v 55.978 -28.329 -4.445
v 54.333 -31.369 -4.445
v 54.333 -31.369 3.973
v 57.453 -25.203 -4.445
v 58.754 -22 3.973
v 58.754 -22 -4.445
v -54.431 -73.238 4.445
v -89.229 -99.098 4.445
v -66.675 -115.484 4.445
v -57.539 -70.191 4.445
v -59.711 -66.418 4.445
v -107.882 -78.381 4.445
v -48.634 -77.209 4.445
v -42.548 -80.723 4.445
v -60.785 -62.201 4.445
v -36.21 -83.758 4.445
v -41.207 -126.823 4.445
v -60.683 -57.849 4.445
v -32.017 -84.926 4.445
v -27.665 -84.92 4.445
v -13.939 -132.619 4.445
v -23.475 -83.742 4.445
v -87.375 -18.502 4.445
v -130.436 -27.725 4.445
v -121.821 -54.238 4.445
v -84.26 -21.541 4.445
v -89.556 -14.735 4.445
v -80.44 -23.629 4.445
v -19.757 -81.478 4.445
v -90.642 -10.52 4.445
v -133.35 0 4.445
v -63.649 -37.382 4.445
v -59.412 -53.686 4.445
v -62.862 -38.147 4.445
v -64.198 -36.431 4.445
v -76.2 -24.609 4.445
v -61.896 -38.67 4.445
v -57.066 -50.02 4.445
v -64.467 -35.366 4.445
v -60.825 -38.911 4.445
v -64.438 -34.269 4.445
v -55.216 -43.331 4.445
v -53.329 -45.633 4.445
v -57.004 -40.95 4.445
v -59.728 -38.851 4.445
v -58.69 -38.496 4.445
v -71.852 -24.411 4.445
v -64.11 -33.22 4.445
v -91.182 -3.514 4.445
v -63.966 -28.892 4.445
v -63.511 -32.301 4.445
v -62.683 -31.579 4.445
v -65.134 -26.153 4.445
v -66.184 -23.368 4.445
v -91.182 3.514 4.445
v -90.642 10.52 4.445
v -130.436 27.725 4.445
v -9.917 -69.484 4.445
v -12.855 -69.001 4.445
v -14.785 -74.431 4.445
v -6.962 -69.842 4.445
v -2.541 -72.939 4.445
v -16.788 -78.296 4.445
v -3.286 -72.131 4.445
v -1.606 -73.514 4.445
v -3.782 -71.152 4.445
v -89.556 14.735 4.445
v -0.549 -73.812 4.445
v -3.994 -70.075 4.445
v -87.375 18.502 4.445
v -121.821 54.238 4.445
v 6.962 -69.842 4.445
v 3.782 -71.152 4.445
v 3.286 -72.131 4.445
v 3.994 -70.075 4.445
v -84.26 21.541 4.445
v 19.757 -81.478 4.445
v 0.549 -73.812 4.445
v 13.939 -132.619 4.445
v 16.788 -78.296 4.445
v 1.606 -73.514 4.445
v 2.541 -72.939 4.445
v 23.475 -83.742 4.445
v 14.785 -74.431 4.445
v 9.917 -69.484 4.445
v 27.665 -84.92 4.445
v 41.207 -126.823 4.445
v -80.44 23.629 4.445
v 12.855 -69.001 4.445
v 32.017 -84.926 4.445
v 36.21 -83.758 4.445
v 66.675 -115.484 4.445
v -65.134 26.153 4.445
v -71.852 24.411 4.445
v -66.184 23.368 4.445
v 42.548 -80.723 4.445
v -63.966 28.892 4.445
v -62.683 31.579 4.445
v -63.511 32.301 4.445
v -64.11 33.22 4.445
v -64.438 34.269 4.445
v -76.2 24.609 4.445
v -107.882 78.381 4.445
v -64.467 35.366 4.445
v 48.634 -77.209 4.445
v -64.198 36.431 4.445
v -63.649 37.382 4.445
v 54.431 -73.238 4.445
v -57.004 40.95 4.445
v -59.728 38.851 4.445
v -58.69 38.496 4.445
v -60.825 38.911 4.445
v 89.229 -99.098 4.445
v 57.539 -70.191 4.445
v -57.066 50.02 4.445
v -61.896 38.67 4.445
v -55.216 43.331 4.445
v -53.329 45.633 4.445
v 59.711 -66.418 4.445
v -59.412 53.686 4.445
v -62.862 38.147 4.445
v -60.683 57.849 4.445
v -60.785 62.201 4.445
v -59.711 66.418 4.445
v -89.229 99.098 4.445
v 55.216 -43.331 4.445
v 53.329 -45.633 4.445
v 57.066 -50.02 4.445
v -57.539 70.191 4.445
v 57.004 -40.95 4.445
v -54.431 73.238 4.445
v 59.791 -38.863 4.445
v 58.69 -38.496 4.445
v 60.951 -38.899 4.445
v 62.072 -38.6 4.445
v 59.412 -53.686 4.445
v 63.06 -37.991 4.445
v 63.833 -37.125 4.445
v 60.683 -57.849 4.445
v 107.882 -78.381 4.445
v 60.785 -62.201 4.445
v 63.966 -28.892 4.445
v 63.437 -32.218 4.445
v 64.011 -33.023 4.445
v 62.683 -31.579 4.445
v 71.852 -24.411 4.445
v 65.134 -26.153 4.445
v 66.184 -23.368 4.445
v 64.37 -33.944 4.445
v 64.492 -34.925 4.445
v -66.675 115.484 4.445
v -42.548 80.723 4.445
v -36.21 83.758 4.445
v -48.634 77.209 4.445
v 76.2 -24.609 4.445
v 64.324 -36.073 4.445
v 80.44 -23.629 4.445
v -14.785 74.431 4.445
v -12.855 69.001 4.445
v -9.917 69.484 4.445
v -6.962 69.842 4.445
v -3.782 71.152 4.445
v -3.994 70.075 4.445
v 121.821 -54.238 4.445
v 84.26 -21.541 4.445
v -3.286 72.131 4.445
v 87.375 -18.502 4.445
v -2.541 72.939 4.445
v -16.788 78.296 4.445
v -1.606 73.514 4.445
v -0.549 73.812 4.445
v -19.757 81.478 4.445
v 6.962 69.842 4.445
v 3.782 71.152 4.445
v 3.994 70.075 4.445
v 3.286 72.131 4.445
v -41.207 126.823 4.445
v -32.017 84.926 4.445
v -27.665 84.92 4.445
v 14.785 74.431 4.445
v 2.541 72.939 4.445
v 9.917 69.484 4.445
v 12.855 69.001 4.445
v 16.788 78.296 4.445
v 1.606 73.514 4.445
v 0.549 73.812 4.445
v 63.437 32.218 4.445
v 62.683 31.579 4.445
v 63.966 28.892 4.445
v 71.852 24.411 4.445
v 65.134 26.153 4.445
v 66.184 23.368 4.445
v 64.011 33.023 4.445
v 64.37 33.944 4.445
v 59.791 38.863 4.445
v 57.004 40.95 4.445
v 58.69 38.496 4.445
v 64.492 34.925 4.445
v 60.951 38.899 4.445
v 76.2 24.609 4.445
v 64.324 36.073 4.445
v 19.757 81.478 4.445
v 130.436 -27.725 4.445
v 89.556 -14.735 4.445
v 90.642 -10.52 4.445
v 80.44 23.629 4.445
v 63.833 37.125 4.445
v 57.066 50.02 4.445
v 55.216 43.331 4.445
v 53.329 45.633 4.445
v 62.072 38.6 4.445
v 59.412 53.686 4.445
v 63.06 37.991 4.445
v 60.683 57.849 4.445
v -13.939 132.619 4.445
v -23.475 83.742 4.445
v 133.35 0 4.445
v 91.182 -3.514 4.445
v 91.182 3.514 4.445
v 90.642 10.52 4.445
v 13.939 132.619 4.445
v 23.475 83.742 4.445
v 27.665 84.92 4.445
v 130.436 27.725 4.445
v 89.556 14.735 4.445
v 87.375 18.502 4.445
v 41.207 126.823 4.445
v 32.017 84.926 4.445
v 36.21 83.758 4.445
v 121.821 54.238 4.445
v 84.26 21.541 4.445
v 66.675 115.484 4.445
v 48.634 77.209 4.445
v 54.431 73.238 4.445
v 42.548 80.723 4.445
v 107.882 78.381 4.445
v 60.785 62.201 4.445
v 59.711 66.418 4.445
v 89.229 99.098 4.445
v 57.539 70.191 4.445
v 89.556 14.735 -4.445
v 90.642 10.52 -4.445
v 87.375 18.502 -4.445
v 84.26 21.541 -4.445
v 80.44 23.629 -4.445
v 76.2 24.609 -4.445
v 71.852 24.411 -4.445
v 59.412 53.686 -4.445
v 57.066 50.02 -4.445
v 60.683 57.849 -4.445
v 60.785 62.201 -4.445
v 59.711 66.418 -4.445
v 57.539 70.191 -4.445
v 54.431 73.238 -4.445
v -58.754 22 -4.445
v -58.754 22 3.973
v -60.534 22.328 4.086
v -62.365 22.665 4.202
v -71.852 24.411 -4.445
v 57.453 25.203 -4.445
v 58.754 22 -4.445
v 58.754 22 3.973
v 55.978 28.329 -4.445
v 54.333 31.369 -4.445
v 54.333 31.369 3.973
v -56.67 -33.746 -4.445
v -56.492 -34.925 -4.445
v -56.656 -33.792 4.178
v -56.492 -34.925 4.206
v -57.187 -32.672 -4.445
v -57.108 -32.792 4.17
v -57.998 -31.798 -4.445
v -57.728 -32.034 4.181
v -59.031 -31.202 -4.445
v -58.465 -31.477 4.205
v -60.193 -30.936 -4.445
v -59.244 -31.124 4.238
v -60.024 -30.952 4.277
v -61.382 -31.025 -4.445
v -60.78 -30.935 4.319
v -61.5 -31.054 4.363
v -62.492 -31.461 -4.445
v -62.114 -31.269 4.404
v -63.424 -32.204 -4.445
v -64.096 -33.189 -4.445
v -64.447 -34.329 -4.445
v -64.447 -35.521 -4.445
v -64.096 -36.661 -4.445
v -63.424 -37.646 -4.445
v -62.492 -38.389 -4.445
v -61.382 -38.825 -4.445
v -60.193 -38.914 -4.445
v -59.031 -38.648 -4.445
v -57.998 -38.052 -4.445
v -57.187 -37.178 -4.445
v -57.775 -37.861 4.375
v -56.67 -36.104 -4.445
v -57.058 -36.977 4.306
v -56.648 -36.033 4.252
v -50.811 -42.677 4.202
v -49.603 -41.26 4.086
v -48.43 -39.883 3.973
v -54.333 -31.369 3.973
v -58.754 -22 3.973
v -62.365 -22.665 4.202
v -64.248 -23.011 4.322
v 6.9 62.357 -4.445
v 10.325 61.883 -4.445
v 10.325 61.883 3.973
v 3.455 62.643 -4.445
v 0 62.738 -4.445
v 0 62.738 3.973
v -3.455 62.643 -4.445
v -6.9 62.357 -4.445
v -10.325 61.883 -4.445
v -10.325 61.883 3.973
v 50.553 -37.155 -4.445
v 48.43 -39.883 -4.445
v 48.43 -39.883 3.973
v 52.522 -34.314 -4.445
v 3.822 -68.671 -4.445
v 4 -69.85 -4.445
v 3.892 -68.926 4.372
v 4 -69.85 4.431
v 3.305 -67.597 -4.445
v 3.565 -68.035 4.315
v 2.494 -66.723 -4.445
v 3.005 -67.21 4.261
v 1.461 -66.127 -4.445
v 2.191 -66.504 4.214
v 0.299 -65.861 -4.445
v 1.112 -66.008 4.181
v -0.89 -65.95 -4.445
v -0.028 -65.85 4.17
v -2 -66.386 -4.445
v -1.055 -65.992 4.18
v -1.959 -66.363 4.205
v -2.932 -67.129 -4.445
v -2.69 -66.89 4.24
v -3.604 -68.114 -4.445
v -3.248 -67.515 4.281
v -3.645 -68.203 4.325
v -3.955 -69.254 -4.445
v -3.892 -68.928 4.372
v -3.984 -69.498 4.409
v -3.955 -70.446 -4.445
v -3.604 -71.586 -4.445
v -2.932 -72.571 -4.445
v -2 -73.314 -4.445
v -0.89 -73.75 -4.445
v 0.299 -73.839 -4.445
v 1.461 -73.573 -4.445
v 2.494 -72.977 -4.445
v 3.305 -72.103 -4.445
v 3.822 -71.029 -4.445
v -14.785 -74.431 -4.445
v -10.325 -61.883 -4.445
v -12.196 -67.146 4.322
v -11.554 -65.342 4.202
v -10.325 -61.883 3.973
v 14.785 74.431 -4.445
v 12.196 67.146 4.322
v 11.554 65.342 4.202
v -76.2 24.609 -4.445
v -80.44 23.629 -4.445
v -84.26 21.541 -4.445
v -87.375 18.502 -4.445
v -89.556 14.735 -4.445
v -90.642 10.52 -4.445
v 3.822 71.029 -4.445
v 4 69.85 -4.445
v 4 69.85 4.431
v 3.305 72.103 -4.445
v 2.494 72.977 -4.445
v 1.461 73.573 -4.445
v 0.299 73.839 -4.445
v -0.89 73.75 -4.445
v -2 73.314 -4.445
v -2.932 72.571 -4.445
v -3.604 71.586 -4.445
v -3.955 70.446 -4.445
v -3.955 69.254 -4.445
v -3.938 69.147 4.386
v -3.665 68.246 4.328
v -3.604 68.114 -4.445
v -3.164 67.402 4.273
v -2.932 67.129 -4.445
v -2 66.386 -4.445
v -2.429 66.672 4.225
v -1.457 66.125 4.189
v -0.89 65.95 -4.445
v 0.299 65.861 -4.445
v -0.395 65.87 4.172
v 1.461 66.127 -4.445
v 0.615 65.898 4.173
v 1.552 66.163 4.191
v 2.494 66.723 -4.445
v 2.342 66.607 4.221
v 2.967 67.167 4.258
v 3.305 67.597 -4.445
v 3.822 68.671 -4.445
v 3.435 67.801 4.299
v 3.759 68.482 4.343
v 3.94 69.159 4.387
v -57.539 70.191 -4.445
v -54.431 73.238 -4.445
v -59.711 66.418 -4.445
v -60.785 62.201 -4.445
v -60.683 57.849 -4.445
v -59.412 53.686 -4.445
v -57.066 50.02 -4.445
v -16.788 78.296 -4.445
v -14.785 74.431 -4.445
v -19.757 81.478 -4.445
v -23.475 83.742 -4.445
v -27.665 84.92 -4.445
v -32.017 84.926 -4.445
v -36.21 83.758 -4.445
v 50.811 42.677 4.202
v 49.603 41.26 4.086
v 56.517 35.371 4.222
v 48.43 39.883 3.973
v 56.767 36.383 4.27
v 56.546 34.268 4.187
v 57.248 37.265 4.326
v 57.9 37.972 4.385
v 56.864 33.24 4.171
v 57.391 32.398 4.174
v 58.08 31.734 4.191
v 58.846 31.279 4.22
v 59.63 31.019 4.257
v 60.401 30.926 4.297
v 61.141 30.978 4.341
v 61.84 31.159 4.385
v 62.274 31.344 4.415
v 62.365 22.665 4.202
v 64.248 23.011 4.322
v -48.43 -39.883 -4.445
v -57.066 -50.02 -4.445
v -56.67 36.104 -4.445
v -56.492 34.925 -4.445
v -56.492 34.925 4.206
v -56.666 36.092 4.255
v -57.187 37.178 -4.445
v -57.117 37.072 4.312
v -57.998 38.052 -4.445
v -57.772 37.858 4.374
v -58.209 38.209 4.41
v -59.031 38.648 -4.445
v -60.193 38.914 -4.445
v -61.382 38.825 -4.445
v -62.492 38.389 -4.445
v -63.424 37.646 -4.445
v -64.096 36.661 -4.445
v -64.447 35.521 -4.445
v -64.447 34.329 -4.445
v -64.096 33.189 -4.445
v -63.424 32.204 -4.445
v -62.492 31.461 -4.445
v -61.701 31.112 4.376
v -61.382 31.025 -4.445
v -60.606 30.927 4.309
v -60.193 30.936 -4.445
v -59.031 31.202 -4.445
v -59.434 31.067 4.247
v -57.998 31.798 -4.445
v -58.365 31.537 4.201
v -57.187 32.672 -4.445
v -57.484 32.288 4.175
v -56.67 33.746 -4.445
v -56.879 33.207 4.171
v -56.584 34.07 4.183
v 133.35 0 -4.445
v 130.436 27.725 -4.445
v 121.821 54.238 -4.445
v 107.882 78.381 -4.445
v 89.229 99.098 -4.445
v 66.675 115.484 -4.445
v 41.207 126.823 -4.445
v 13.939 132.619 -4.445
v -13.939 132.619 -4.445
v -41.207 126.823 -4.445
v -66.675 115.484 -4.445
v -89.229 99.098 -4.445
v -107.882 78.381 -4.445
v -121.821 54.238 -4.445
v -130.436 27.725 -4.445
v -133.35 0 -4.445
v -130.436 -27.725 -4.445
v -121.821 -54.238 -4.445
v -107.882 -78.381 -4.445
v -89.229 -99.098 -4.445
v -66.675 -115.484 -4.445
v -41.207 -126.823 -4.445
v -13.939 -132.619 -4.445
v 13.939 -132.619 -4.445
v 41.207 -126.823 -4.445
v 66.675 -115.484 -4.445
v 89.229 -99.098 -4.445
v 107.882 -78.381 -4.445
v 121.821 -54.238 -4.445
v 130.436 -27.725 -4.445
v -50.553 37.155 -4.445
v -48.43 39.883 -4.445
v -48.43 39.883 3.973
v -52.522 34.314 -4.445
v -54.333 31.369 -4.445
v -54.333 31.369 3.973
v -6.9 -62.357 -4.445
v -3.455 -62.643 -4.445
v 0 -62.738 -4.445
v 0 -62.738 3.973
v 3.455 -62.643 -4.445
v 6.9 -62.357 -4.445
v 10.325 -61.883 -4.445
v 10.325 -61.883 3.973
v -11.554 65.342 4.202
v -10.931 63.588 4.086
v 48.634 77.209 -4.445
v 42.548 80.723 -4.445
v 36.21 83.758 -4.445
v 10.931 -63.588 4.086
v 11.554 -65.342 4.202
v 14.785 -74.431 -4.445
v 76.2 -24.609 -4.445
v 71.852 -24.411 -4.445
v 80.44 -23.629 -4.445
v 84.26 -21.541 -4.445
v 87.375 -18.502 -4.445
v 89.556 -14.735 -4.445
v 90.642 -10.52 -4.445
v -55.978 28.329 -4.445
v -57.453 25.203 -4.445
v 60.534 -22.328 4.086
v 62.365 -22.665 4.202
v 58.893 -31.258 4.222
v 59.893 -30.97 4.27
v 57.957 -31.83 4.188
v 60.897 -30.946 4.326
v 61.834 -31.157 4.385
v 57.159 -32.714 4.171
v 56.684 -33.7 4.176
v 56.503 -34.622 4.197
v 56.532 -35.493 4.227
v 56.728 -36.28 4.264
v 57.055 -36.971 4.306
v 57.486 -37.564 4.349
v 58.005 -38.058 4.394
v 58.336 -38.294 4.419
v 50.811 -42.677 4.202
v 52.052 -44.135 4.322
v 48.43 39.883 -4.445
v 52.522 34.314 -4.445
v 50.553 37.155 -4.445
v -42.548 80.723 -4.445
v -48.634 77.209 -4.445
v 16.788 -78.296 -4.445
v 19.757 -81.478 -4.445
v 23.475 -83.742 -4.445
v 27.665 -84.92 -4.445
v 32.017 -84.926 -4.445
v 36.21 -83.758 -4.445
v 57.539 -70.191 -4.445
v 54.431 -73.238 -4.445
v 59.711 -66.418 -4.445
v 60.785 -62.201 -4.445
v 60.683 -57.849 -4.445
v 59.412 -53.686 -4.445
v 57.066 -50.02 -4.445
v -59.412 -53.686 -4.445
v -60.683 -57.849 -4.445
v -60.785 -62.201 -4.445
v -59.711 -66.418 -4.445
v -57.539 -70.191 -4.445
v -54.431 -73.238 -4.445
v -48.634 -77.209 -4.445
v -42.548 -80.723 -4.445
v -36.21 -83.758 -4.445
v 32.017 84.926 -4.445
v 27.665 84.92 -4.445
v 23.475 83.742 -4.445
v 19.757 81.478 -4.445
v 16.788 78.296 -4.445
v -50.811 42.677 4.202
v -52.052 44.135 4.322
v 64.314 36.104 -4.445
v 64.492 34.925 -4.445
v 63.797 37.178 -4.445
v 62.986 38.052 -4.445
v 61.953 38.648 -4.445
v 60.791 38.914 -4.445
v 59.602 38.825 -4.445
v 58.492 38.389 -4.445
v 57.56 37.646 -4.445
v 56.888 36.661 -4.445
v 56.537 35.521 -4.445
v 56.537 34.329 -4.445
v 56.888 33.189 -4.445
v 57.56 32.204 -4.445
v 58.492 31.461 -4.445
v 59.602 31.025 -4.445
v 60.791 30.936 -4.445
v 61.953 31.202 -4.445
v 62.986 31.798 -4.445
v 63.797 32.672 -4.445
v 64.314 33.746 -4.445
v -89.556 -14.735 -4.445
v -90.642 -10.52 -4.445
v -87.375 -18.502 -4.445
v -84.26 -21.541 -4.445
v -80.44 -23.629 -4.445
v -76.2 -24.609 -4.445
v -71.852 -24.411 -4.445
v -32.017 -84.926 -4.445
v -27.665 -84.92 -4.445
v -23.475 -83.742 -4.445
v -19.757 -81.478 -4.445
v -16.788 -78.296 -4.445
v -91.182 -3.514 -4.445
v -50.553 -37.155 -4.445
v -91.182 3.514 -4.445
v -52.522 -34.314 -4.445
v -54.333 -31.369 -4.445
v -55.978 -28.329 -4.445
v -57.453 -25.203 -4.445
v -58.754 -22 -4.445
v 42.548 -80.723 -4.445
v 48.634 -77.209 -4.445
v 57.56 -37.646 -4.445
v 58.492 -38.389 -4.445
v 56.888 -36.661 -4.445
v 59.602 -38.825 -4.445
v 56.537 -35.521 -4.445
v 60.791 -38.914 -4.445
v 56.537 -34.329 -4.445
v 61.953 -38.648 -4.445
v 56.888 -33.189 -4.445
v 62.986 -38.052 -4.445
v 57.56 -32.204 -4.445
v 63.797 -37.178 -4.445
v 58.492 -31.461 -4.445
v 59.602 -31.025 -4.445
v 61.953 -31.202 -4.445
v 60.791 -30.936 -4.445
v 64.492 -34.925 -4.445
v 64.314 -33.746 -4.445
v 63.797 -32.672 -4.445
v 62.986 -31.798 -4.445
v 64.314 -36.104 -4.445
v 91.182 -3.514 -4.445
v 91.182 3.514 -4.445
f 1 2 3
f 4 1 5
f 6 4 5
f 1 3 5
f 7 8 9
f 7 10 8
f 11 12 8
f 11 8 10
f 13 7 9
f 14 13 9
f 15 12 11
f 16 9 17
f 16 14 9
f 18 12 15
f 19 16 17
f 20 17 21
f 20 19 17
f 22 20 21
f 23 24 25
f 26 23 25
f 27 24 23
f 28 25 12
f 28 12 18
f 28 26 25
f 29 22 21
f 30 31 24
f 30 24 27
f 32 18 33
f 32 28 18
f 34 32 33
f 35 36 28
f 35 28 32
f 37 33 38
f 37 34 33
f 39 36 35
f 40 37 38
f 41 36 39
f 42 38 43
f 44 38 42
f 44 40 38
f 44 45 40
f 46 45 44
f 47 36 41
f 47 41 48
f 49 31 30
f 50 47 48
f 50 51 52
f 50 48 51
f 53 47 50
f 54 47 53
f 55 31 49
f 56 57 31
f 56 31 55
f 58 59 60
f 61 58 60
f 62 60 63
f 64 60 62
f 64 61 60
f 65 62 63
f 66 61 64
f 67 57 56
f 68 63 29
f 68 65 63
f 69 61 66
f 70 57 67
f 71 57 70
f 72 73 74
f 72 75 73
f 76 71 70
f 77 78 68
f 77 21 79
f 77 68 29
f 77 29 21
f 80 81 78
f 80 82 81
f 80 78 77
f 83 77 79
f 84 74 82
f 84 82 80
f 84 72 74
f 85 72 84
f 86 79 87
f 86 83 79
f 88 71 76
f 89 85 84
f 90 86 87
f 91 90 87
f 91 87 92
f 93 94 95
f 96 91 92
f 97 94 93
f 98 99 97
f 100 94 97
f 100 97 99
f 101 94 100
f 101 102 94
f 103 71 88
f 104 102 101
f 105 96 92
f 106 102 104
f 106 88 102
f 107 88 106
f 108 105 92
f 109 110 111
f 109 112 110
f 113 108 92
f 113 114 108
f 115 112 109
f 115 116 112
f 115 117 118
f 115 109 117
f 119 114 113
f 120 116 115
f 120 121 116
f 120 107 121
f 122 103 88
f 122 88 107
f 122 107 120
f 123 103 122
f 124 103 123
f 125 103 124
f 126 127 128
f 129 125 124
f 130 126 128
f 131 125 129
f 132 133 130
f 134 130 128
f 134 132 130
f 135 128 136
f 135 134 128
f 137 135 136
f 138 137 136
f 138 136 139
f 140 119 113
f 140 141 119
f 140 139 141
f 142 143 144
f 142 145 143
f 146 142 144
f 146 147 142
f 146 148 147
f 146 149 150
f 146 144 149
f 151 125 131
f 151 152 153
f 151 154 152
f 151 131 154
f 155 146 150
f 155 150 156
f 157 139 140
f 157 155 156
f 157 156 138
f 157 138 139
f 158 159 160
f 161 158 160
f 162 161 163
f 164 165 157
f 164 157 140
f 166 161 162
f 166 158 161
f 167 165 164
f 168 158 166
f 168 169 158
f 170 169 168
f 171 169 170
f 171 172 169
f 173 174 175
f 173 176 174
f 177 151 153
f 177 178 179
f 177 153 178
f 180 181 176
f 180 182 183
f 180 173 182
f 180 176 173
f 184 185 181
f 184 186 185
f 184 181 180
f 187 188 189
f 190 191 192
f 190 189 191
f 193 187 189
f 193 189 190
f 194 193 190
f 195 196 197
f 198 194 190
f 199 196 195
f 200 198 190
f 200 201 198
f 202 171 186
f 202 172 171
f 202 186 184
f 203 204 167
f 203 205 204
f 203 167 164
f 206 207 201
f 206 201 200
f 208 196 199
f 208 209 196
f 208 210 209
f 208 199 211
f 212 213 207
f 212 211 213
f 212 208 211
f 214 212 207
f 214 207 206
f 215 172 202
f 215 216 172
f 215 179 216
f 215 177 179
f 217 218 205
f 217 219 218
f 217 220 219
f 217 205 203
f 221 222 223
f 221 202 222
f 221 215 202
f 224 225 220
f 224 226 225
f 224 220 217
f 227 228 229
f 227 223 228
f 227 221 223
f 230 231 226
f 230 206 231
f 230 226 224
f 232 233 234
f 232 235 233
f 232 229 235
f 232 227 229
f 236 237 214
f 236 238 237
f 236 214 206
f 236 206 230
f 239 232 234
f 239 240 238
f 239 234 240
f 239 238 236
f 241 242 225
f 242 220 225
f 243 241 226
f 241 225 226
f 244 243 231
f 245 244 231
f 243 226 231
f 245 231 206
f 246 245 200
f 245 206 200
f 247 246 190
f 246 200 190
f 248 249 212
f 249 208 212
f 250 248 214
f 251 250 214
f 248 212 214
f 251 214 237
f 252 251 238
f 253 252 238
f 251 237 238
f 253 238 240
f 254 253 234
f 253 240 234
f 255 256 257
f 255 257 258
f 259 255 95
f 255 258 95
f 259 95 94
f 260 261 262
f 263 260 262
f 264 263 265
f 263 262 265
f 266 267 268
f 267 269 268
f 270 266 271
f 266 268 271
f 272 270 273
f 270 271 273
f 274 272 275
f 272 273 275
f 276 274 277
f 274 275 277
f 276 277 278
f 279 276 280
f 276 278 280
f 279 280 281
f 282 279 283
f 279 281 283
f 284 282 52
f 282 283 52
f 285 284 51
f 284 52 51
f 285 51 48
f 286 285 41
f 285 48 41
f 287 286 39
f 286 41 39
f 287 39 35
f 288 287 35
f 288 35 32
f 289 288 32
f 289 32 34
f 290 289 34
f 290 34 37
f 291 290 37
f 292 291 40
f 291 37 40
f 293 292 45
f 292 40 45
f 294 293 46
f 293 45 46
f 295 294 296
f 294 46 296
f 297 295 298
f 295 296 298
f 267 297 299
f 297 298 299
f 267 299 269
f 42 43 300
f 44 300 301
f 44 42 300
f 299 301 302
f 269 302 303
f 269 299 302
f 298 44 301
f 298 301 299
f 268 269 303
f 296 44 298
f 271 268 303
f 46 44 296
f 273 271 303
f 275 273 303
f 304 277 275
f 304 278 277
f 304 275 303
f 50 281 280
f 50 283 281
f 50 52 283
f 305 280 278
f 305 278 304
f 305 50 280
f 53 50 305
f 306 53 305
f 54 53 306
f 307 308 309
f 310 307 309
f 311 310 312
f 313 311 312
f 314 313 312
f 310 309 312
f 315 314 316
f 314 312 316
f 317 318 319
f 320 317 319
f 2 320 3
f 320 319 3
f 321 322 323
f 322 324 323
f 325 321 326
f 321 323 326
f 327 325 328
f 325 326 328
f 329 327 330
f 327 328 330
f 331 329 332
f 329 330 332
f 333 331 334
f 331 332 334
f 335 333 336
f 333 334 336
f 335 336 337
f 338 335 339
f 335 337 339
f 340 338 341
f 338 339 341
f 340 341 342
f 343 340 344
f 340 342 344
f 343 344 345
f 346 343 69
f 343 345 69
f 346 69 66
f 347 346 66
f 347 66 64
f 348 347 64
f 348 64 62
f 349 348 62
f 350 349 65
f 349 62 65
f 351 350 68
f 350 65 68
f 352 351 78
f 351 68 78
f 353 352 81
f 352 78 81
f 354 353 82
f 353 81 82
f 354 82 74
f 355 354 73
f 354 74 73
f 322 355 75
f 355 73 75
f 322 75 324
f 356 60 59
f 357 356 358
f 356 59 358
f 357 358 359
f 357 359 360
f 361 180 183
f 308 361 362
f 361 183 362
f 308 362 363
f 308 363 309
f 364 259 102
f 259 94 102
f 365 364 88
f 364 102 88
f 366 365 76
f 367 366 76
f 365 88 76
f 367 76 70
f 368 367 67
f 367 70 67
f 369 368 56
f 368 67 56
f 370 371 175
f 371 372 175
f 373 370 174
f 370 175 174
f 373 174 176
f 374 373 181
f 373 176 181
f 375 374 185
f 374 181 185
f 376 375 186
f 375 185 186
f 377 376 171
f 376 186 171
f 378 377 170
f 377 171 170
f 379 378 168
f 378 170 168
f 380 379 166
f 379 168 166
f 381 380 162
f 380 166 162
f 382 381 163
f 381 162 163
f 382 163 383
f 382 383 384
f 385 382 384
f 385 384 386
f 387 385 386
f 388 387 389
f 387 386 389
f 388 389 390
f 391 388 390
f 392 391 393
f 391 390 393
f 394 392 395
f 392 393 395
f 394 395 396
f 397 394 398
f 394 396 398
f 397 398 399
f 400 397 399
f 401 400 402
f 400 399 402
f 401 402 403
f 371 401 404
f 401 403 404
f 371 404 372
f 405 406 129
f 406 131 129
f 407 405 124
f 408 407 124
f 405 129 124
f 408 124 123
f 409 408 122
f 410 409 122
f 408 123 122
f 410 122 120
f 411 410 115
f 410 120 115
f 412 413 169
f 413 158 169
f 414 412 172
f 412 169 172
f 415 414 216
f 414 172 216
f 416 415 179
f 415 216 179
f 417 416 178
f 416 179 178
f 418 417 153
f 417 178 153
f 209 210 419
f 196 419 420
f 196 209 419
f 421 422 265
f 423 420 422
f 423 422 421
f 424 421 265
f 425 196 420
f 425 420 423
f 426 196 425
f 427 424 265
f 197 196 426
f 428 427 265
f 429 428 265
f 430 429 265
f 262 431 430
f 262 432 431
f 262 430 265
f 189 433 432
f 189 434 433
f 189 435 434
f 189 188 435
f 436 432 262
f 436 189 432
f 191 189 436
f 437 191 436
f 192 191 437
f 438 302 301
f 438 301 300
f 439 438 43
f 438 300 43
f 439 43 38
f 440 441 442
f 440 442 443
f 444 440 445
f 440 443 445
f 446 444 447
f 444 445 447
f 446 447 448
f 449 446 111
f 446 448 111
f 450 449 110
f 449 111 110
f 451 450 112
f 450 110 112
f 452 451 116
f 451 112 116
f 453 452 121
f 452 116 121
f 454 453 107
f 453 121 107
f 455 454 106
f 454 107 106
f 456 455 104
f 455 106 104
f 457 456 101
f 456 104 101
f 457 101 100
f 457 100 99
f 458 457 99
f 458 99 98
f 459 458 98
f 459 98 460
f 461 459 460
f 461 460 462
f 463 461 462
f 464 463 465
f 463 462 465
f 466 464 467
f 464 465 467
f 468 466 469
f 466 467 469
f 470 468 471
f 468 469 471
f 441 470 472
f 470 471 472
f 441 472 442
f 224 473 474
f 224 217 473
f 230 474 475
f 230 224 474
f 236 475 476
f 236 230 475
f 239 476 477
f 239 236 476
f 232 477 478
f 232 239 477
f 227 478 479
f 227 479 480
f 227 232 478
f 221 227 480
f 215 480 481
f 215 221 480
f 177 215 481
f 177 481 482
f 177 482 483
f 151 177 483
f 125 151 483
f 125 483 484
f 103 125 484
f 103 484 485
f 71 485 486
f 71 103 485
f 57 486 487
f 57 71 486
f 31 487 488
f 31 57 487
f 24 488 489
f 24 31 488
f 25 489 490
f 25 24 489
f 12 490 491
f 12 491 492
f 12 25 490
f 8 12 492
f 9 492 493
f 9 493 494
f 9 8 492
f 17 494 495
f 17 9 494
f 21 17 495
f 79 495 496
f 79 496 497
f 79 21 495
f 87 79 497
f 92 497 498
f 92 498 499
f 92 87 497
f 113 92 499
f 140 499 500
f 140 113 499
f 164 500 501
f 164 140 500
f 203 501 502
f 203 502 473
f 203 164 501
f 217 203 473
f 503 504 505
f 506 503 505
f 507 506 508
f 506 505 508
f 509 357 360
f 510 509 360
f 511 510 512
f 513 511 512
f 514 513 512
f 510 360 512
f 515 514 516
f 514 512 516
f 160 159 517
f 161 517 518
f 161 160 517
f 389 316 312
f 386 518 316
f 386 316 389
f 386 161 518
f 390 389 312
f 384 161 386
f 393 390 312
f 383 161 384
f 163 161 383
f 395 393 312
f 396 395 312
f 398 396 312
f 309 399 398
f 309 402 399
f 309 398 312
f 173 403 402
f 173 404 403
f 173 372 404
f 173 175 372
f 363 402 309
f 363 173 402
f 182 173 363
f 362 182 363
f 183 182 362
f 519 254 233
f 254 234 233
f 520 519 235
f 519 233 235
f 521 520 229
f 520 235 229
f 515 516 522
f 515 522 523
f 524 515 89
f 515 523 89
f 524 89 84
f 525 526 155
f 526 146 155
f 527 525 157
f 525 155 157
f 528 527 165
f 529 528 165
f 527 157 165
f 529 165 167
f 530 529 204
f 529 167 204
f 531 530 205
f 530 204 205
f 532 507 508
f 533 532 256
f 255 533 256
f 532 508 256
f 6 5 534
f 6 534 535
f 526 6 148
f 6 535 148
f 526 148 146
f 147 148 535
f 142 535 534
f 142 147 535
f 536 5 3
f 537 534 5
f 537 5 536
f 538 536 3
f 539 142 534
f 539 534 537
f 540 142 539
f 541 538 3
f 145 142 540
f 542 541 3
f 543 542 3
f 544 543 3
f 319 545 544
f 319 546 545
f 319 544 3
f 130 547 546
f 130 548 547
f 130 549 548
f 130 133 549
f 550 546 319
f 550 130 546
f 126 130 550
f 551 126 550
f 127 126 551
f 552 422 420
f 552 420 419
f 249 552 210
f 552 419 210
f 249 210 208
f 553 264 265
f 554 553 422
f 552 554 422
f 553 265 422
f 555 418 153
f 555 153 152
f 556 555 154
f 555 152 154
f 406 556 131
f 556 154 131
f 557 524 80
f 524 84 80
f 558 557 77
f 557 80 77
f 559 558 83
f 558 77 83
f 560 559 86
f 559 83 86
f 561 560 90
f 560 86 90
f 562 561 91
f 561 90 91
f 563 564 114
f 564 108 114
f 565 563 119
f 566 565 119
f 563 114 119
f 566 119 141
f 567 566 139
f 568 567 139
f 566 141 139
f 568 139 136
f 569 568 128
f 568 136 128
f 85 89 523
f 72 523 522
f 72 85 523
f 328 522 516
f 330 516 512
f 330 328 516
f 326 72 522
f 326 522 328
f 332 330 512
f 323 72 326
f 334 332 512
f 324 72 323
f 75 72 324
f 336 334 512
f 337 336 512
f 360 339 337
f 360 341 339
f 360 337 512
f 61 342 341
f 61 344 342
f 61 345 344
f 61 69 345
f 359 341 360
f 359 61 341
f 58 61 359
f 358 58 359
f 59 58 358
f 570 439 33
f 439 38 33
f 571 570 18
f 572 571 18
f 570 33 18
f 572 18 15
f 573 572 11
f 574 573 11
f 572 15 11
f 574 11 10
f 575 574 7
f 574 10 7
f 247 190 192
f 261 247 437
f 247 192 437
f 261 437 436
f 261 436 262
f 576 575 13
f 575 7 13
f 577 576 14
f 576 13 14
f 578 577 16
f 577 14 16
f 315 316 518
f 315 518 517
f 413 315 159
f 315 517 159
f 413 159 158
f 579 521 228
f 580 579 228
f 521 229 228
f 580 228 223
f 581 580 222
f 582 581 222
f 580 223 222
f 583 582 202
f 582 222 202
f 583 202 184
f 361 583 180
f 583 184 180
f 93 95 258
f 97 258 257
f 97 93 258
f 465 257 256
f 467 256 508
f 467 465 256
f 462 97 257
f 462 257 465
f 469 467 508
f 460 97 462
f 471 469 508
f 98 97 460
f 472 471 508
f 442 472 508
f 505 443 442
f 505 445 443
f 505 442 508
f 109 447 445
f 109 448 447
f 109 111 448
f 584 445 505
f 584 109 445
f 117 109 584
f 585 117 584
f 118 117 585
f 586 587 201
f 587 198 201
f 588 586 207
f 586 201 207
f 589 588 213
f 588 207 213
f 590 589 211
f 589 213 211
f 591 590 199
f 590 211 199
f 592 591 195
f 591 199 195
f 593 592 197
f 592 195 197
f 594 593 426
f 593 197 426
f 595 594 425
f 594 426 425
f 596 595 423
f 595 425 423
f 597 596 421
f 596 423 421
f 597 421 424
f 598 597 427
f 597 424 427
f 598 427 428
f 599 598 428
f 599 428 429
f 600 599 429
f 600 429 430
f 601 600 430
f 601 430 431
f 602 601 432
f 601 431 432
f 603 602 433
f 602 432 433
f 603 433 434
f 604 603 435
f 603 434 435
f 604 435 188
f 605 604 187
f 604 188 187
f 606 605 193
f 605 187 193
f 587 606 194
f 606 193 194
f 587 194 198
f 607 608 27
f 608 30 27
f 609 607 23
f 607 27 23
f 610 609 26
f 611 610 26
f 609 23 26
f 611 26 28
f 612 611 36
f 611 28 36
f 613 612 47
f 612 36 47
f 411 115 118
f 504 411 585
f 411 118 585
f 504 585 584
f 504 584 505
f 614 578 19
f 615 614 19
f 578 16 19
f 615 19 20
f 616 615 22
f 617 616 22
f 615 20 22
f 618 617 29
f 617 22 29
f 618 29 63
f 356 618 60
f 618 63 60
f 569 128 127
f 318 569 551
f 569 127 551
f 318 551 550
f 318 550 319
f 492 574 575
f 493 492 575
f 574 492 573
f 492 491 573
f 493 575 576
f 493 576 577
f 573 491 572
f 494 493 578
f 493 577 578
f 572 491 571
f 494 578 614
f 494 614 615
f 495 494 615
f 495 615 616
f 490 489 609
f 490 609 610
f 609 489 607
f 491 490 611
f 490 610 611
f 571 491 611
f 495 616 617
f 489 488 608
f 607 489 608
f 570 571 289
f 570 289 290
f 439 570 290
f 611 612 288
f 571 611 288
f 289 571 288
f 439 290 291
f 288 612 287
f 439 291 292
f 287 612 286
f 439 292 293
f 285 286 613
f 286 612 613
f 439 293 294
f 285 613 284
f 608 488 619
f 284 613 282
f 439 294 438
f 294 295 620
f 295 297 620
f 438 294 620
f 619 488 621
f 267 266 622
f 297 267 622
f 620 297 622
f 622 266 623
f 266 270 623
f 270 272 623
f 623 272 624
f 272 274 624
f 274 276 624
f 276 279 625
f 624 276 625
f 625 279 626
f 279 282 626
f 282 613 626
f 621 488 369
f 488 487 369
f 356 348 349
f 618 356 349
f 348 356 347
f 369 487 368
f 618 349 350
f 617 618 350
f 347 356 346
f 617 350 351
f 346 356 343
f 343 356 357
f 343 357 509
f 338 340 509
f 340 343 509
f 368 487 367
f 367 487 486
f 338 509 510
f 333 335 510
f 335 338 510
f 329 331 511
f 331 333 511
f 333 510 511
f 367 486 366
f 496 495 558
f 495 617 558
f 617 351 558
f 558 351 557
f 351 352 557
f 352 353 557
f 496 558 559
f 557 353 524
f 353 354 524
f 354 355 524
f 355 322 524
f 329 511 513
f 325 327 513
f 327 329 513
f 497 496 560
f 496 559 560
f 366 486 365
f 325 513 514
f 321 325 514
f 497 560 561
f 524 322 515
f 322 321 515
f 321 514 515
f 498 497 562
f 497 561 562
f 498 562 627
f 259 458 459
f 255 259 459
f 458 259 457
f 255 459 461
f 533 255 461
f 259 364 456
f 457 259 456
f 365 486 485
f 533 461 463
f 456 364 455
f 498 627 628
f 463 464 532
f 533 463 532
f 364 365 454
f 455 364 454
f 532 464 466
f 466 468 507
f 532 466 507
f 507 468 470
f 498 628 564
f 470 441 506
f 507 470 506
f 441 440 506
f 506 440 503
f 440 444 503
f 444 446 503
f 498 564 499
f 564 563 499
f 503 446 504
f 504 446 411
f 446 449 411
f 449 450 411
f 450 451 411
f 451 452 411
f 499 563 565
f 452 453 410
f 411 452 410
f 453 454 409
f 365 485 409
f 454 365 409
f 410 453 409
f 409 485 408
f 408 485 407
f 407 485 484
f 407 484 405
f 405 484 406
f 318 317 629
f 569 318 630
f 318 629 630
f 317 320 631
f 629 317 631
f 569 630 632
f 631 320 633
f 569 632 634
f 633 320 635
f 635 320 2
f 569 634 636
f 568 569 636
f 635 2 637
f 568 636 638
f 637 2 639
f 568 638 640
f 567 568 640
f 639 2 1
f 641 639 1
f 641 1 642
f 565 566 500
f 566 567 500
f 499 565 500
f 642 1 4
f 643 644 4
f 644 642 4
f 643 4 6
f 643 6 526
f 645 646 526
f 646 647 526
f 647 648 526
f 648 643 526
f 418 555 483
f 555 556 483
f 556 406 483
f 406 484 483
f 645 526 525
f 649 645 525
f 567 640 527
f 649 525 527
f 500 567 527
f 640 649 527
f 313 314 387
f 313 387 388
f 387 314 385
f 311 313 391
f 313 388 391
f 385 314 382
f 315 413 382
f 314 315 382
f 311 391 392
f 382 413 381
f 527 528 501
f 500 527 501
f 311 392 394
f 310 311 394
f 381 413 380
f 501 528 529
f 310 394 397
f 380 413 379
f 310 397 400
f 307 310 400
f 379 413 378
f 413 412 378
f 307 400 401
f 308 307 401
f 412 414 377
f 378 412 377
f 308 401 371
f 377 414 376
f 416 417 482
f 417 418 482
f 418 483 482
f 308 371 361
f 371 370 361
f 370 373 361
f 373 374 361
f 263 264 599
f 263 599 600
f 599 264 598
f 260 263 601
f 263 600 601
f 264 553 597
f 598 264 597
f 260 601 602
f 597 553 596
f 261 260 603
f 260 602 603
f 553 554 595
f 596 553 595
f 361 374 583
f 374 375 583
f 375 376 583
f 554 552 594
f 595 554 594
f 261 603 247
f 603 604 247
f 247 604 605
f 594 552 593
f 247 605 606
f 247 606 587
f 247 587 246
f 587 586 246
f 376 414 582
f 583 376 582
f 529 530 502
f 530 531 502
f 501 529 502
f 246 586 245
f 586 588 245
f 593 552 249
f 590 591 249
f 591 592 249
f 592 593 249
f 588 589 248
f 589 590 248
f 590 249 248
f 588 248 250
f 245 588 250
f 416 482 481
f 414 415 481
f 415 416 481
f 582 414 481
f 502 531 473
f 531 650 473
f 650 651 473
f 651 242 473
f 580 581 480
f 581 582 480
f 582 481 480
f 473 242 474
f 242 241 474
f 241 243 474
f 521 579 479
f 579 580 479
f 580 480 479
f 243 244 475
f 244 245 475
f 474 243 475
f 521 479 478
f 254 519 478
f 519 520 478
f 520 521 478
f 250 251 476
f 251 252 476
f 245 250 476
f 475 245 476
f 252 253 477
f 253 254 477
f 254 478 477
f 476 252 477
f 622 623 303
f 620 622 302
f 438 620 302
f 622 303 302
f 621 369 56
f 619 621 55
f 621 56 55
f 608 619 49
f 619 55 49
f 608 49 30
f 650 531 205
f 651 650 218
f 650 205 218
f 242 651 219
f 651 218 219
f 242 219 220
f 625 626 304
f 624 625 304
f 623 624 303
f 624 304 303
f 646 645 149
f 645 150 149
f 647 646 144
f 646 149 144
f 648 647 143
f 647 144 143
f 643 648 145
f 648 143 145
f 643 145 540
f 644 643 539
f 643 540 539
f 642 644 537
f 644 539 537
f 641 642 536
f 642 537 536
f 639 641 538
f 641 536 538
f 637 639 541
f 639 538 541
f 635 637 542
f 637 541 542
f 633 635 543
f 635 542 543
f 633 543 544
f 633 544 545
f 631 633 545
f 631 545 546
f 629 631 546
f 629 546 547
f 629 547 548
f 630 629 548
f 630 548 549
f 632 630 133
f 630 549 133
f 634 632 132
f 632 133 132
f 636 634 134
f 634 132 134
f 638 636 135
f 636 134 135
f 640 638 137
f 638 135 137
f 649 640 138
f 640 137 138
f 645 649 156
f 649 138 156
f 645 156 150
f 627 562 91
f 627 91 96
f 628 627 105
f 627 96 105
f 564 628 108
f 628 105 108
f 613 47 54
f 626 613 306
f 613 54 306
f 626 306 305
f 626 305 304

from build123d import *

# Parameters (mm, degrees)
BOSS_EXTRUDE1_DEPTH      = 4.445
BOSS_EXTRUDE1_DEPTH_BACK = 4.445
SKETCH1_R                = 133.35
SKETCH1_R_2              = 4


with BuildPart() as part:
    # Sketch1 → Boss-Extrude1 (new, two sides: drawn at the far end of the back side and taken through both)
    with BuildSketch(Plane.XY.offset(-BOSS_EXTRUDE1_DEPTH_BACK)):
        Circle(SKETCH1_R)
        with Locations((0, 69.85)):
            Circle(SKETCH1_R_2, mode=Mode.SUBTRACT)
        with Locations((60.491874454, 34.925)):
            Circle(SKETCH1_R_2, mode=Mode.SUBTRACT)
        with Locations((60.491874454, -34.925)):
            Circle(SKETCH1_R_2, mode=Mode.SUBTRACT)
        with Locations((0, -69.85)):
            Circle(SKETCH1_R_2, mode=Mode.SUBTRACT)
        with Locations((-60.491874454, -34.925)):
            Circle(SKETCH1_R_2, mode=Mode.SUBTRACT)
        with Locations((-60.491874454, 34.925)):
            Circle(SKETCH1_R_2, mode=Mode.SUBTRACT)
        with BuildLine():
            Line((14.785375278, 74.430875165), (10.324543782, 61.882634395))
            ThreePointArc((10.324543782, 61.882634395), (5.179957882, 62.523792914), (0, 62.738))
            ThreePointArc((0, 62.738), (-5.179957882, 62.523792914), (-10.324543782, 61.882634395))
            Line((-10.324543782, 61.882634395), (-14.785375278, 74.430875165))
            ThreePointArc((-14.785375278, 74.430875165), (-23.474698759, 83.741706154), (-36.210304588, 83.757843464))
            ThreePointArc((-36.210304588, 83.757843464), (-45.625, 79.024818095), (-54.431267912, 73.237965383))
            ThreePointArc((-54.431267912, 73.237965383), (-60.785095506, 62.200538548), (-57.06634108, 50.019948178))
            Line((-57.06634108, 50.019948178), (-48.429661548, 39.882634395))
            ThreePointArc((-48.429661548, 39.882634395), (-51.557214064, 35.747871573), (-54.332701783, 31.369))
            ThreePointArc((-54.332701783, 31.369), (-56.737171945, 26.775921341), (-58.75420533, 22))
            Line((-58.75420533, 22), (-71.851716358, 24.410926987))
            ThreePointArc((-71.851716358, 24.410926987), (-84.259794265, 21.541167606), (-90.641572499, 10.51987808))
            ThreePointArc((-90.641572499, 10.51987808), (-91.25, 0), (-90.641572499, -10.51987808))
            ThreePointArc((-90.641572499, -10.51987808), (-84.259794265, -21.541167606), (-71.851716358, -24.410926987))
            Line((-71.851716358, -24.410926987), (-58.75420533, -22))
            ThreePointArc((-58.75420533, -22), (-56.737171945, -26.775921341), (-54.332701783, -31.369))
            ThreePointArc((-54.332701783, -31.369), (-51.557214064, -35.747871573), (-48.429661548, -39.882634395))
            Line((-48.429661548, -39.882634395), (-57.06634108, -50.019948178))
            ThreePointArc((-57.06634108, -50.019948178), (-60.785095506, -62.200538548), (-54.431267912, -73.237965383))
            ThreePointArc((-54.431267912, -73.237965383), (-45.625, -79.024818095), (-36.210304588, -83.757843464))
            ThreePointArc((-36.210304588, -83.757843464), (-23.474698759, -83.741706154), (-14.785375278, -74.430875165))
            Line((-14.785375278, -74.430875165), (-10.324543782, -61.882634395))
            ThreePointArc((-10.324543782, -61.882634395), (-5.179957882, -62.523792914), (0, -62.738))
            ThreePointArc((0, -62.738), (5.179957882, -62.523792914), (10.324543782, -61.882634395))
            Line((10.324543782, -61.882634395), (14.785375278, -74.430875165))
            ThreePointArc((14.785375278, -74.430875165), (23.474698759, -83.741706154), (36.210304588, -83.757843464))
            ThreePointArc((36.210304588, -83.757843464), (45.625, -79.024818095), (54.431267912, -73.237965383))
            ThreePointArc((54.431267912, -73.237965383), (60.785095506, -62.200538548), (57.06634108, -50.019948178))
            Line((57.06634108, -50.019948178), (48.429661548, -39.882634395))
            ThreePointArc((48.429661548, -39.882634395), (51.557214064, -35.747871573), (54.332701783, -31.369))
            ThreePointArc((54.332701783, -31.369), (56.737171945, -26.775921341), (58.75420533, -22))
            Line((58.75420533, -22), (71.851716358, -24.410926987))
            ThreePointArc((71.851716358, -24.410926987), (84.259794265, -21.541167606), (90.641572499, -10.51987808))
            ThreePointArc((90.641572499, -10.51987808), (91.25, 0), (90.641572499, 10.51987808))
            ThreePointArc((90.641572499, 10.51987808), (84.259794265, 21.541167606), (71.851716358, 24.410926987))
            Line((71.851716358, 24.410926987), (58.75420533, 22))
            ThreePointArc((58.75420533, 22), (56.737171945, 26.775921341), (54.332701783, 31.369))
            ThreePointArc((54.332701783, 31.369), (51.557214064, 35.747871573), (48.429661548, 39.882634395))
            Line((48.429661548, 39.882634395), (57.06634108, 50.019948178))
            ThreePointArc((57.06634108, 50.019948178), (60.785095506, 62.200538548), (54.431267912, 73.237965383))
            ThreePointArc((54.431267912, 73.237965383), (45.625, 79.024818095), (36.210304588, 83.757843464))
            ThreePointArc((36.210304588, 83.757843464), (23.474698759, 83.741706154), (14.785375278, 74.430875165))
        make_face(mode=Mode.SUBTRACT)
    extrude(amount=BOSS_EXTRUDE1_DEPTH + BOSS_EXTRUDE1_DEPTH_BACK)

    # Sketch2 → Cut-Revolve1 (revolve, cut)
    with BuildSketch(Plane(origin=(0, 0, 0), x_dir=(0, 0, -1), z_dir=(1, 0, 0))):
        Polygon((0, 0), (-8.445, 133.35), (-26.557438236, 133.35), (-26.557438236, 0), align=None)
    revolve(axis=Axis((0, 0, 33.831792396), (0, 0, -1)), mode=Mode.SUBTRACT)


solid = part.part
